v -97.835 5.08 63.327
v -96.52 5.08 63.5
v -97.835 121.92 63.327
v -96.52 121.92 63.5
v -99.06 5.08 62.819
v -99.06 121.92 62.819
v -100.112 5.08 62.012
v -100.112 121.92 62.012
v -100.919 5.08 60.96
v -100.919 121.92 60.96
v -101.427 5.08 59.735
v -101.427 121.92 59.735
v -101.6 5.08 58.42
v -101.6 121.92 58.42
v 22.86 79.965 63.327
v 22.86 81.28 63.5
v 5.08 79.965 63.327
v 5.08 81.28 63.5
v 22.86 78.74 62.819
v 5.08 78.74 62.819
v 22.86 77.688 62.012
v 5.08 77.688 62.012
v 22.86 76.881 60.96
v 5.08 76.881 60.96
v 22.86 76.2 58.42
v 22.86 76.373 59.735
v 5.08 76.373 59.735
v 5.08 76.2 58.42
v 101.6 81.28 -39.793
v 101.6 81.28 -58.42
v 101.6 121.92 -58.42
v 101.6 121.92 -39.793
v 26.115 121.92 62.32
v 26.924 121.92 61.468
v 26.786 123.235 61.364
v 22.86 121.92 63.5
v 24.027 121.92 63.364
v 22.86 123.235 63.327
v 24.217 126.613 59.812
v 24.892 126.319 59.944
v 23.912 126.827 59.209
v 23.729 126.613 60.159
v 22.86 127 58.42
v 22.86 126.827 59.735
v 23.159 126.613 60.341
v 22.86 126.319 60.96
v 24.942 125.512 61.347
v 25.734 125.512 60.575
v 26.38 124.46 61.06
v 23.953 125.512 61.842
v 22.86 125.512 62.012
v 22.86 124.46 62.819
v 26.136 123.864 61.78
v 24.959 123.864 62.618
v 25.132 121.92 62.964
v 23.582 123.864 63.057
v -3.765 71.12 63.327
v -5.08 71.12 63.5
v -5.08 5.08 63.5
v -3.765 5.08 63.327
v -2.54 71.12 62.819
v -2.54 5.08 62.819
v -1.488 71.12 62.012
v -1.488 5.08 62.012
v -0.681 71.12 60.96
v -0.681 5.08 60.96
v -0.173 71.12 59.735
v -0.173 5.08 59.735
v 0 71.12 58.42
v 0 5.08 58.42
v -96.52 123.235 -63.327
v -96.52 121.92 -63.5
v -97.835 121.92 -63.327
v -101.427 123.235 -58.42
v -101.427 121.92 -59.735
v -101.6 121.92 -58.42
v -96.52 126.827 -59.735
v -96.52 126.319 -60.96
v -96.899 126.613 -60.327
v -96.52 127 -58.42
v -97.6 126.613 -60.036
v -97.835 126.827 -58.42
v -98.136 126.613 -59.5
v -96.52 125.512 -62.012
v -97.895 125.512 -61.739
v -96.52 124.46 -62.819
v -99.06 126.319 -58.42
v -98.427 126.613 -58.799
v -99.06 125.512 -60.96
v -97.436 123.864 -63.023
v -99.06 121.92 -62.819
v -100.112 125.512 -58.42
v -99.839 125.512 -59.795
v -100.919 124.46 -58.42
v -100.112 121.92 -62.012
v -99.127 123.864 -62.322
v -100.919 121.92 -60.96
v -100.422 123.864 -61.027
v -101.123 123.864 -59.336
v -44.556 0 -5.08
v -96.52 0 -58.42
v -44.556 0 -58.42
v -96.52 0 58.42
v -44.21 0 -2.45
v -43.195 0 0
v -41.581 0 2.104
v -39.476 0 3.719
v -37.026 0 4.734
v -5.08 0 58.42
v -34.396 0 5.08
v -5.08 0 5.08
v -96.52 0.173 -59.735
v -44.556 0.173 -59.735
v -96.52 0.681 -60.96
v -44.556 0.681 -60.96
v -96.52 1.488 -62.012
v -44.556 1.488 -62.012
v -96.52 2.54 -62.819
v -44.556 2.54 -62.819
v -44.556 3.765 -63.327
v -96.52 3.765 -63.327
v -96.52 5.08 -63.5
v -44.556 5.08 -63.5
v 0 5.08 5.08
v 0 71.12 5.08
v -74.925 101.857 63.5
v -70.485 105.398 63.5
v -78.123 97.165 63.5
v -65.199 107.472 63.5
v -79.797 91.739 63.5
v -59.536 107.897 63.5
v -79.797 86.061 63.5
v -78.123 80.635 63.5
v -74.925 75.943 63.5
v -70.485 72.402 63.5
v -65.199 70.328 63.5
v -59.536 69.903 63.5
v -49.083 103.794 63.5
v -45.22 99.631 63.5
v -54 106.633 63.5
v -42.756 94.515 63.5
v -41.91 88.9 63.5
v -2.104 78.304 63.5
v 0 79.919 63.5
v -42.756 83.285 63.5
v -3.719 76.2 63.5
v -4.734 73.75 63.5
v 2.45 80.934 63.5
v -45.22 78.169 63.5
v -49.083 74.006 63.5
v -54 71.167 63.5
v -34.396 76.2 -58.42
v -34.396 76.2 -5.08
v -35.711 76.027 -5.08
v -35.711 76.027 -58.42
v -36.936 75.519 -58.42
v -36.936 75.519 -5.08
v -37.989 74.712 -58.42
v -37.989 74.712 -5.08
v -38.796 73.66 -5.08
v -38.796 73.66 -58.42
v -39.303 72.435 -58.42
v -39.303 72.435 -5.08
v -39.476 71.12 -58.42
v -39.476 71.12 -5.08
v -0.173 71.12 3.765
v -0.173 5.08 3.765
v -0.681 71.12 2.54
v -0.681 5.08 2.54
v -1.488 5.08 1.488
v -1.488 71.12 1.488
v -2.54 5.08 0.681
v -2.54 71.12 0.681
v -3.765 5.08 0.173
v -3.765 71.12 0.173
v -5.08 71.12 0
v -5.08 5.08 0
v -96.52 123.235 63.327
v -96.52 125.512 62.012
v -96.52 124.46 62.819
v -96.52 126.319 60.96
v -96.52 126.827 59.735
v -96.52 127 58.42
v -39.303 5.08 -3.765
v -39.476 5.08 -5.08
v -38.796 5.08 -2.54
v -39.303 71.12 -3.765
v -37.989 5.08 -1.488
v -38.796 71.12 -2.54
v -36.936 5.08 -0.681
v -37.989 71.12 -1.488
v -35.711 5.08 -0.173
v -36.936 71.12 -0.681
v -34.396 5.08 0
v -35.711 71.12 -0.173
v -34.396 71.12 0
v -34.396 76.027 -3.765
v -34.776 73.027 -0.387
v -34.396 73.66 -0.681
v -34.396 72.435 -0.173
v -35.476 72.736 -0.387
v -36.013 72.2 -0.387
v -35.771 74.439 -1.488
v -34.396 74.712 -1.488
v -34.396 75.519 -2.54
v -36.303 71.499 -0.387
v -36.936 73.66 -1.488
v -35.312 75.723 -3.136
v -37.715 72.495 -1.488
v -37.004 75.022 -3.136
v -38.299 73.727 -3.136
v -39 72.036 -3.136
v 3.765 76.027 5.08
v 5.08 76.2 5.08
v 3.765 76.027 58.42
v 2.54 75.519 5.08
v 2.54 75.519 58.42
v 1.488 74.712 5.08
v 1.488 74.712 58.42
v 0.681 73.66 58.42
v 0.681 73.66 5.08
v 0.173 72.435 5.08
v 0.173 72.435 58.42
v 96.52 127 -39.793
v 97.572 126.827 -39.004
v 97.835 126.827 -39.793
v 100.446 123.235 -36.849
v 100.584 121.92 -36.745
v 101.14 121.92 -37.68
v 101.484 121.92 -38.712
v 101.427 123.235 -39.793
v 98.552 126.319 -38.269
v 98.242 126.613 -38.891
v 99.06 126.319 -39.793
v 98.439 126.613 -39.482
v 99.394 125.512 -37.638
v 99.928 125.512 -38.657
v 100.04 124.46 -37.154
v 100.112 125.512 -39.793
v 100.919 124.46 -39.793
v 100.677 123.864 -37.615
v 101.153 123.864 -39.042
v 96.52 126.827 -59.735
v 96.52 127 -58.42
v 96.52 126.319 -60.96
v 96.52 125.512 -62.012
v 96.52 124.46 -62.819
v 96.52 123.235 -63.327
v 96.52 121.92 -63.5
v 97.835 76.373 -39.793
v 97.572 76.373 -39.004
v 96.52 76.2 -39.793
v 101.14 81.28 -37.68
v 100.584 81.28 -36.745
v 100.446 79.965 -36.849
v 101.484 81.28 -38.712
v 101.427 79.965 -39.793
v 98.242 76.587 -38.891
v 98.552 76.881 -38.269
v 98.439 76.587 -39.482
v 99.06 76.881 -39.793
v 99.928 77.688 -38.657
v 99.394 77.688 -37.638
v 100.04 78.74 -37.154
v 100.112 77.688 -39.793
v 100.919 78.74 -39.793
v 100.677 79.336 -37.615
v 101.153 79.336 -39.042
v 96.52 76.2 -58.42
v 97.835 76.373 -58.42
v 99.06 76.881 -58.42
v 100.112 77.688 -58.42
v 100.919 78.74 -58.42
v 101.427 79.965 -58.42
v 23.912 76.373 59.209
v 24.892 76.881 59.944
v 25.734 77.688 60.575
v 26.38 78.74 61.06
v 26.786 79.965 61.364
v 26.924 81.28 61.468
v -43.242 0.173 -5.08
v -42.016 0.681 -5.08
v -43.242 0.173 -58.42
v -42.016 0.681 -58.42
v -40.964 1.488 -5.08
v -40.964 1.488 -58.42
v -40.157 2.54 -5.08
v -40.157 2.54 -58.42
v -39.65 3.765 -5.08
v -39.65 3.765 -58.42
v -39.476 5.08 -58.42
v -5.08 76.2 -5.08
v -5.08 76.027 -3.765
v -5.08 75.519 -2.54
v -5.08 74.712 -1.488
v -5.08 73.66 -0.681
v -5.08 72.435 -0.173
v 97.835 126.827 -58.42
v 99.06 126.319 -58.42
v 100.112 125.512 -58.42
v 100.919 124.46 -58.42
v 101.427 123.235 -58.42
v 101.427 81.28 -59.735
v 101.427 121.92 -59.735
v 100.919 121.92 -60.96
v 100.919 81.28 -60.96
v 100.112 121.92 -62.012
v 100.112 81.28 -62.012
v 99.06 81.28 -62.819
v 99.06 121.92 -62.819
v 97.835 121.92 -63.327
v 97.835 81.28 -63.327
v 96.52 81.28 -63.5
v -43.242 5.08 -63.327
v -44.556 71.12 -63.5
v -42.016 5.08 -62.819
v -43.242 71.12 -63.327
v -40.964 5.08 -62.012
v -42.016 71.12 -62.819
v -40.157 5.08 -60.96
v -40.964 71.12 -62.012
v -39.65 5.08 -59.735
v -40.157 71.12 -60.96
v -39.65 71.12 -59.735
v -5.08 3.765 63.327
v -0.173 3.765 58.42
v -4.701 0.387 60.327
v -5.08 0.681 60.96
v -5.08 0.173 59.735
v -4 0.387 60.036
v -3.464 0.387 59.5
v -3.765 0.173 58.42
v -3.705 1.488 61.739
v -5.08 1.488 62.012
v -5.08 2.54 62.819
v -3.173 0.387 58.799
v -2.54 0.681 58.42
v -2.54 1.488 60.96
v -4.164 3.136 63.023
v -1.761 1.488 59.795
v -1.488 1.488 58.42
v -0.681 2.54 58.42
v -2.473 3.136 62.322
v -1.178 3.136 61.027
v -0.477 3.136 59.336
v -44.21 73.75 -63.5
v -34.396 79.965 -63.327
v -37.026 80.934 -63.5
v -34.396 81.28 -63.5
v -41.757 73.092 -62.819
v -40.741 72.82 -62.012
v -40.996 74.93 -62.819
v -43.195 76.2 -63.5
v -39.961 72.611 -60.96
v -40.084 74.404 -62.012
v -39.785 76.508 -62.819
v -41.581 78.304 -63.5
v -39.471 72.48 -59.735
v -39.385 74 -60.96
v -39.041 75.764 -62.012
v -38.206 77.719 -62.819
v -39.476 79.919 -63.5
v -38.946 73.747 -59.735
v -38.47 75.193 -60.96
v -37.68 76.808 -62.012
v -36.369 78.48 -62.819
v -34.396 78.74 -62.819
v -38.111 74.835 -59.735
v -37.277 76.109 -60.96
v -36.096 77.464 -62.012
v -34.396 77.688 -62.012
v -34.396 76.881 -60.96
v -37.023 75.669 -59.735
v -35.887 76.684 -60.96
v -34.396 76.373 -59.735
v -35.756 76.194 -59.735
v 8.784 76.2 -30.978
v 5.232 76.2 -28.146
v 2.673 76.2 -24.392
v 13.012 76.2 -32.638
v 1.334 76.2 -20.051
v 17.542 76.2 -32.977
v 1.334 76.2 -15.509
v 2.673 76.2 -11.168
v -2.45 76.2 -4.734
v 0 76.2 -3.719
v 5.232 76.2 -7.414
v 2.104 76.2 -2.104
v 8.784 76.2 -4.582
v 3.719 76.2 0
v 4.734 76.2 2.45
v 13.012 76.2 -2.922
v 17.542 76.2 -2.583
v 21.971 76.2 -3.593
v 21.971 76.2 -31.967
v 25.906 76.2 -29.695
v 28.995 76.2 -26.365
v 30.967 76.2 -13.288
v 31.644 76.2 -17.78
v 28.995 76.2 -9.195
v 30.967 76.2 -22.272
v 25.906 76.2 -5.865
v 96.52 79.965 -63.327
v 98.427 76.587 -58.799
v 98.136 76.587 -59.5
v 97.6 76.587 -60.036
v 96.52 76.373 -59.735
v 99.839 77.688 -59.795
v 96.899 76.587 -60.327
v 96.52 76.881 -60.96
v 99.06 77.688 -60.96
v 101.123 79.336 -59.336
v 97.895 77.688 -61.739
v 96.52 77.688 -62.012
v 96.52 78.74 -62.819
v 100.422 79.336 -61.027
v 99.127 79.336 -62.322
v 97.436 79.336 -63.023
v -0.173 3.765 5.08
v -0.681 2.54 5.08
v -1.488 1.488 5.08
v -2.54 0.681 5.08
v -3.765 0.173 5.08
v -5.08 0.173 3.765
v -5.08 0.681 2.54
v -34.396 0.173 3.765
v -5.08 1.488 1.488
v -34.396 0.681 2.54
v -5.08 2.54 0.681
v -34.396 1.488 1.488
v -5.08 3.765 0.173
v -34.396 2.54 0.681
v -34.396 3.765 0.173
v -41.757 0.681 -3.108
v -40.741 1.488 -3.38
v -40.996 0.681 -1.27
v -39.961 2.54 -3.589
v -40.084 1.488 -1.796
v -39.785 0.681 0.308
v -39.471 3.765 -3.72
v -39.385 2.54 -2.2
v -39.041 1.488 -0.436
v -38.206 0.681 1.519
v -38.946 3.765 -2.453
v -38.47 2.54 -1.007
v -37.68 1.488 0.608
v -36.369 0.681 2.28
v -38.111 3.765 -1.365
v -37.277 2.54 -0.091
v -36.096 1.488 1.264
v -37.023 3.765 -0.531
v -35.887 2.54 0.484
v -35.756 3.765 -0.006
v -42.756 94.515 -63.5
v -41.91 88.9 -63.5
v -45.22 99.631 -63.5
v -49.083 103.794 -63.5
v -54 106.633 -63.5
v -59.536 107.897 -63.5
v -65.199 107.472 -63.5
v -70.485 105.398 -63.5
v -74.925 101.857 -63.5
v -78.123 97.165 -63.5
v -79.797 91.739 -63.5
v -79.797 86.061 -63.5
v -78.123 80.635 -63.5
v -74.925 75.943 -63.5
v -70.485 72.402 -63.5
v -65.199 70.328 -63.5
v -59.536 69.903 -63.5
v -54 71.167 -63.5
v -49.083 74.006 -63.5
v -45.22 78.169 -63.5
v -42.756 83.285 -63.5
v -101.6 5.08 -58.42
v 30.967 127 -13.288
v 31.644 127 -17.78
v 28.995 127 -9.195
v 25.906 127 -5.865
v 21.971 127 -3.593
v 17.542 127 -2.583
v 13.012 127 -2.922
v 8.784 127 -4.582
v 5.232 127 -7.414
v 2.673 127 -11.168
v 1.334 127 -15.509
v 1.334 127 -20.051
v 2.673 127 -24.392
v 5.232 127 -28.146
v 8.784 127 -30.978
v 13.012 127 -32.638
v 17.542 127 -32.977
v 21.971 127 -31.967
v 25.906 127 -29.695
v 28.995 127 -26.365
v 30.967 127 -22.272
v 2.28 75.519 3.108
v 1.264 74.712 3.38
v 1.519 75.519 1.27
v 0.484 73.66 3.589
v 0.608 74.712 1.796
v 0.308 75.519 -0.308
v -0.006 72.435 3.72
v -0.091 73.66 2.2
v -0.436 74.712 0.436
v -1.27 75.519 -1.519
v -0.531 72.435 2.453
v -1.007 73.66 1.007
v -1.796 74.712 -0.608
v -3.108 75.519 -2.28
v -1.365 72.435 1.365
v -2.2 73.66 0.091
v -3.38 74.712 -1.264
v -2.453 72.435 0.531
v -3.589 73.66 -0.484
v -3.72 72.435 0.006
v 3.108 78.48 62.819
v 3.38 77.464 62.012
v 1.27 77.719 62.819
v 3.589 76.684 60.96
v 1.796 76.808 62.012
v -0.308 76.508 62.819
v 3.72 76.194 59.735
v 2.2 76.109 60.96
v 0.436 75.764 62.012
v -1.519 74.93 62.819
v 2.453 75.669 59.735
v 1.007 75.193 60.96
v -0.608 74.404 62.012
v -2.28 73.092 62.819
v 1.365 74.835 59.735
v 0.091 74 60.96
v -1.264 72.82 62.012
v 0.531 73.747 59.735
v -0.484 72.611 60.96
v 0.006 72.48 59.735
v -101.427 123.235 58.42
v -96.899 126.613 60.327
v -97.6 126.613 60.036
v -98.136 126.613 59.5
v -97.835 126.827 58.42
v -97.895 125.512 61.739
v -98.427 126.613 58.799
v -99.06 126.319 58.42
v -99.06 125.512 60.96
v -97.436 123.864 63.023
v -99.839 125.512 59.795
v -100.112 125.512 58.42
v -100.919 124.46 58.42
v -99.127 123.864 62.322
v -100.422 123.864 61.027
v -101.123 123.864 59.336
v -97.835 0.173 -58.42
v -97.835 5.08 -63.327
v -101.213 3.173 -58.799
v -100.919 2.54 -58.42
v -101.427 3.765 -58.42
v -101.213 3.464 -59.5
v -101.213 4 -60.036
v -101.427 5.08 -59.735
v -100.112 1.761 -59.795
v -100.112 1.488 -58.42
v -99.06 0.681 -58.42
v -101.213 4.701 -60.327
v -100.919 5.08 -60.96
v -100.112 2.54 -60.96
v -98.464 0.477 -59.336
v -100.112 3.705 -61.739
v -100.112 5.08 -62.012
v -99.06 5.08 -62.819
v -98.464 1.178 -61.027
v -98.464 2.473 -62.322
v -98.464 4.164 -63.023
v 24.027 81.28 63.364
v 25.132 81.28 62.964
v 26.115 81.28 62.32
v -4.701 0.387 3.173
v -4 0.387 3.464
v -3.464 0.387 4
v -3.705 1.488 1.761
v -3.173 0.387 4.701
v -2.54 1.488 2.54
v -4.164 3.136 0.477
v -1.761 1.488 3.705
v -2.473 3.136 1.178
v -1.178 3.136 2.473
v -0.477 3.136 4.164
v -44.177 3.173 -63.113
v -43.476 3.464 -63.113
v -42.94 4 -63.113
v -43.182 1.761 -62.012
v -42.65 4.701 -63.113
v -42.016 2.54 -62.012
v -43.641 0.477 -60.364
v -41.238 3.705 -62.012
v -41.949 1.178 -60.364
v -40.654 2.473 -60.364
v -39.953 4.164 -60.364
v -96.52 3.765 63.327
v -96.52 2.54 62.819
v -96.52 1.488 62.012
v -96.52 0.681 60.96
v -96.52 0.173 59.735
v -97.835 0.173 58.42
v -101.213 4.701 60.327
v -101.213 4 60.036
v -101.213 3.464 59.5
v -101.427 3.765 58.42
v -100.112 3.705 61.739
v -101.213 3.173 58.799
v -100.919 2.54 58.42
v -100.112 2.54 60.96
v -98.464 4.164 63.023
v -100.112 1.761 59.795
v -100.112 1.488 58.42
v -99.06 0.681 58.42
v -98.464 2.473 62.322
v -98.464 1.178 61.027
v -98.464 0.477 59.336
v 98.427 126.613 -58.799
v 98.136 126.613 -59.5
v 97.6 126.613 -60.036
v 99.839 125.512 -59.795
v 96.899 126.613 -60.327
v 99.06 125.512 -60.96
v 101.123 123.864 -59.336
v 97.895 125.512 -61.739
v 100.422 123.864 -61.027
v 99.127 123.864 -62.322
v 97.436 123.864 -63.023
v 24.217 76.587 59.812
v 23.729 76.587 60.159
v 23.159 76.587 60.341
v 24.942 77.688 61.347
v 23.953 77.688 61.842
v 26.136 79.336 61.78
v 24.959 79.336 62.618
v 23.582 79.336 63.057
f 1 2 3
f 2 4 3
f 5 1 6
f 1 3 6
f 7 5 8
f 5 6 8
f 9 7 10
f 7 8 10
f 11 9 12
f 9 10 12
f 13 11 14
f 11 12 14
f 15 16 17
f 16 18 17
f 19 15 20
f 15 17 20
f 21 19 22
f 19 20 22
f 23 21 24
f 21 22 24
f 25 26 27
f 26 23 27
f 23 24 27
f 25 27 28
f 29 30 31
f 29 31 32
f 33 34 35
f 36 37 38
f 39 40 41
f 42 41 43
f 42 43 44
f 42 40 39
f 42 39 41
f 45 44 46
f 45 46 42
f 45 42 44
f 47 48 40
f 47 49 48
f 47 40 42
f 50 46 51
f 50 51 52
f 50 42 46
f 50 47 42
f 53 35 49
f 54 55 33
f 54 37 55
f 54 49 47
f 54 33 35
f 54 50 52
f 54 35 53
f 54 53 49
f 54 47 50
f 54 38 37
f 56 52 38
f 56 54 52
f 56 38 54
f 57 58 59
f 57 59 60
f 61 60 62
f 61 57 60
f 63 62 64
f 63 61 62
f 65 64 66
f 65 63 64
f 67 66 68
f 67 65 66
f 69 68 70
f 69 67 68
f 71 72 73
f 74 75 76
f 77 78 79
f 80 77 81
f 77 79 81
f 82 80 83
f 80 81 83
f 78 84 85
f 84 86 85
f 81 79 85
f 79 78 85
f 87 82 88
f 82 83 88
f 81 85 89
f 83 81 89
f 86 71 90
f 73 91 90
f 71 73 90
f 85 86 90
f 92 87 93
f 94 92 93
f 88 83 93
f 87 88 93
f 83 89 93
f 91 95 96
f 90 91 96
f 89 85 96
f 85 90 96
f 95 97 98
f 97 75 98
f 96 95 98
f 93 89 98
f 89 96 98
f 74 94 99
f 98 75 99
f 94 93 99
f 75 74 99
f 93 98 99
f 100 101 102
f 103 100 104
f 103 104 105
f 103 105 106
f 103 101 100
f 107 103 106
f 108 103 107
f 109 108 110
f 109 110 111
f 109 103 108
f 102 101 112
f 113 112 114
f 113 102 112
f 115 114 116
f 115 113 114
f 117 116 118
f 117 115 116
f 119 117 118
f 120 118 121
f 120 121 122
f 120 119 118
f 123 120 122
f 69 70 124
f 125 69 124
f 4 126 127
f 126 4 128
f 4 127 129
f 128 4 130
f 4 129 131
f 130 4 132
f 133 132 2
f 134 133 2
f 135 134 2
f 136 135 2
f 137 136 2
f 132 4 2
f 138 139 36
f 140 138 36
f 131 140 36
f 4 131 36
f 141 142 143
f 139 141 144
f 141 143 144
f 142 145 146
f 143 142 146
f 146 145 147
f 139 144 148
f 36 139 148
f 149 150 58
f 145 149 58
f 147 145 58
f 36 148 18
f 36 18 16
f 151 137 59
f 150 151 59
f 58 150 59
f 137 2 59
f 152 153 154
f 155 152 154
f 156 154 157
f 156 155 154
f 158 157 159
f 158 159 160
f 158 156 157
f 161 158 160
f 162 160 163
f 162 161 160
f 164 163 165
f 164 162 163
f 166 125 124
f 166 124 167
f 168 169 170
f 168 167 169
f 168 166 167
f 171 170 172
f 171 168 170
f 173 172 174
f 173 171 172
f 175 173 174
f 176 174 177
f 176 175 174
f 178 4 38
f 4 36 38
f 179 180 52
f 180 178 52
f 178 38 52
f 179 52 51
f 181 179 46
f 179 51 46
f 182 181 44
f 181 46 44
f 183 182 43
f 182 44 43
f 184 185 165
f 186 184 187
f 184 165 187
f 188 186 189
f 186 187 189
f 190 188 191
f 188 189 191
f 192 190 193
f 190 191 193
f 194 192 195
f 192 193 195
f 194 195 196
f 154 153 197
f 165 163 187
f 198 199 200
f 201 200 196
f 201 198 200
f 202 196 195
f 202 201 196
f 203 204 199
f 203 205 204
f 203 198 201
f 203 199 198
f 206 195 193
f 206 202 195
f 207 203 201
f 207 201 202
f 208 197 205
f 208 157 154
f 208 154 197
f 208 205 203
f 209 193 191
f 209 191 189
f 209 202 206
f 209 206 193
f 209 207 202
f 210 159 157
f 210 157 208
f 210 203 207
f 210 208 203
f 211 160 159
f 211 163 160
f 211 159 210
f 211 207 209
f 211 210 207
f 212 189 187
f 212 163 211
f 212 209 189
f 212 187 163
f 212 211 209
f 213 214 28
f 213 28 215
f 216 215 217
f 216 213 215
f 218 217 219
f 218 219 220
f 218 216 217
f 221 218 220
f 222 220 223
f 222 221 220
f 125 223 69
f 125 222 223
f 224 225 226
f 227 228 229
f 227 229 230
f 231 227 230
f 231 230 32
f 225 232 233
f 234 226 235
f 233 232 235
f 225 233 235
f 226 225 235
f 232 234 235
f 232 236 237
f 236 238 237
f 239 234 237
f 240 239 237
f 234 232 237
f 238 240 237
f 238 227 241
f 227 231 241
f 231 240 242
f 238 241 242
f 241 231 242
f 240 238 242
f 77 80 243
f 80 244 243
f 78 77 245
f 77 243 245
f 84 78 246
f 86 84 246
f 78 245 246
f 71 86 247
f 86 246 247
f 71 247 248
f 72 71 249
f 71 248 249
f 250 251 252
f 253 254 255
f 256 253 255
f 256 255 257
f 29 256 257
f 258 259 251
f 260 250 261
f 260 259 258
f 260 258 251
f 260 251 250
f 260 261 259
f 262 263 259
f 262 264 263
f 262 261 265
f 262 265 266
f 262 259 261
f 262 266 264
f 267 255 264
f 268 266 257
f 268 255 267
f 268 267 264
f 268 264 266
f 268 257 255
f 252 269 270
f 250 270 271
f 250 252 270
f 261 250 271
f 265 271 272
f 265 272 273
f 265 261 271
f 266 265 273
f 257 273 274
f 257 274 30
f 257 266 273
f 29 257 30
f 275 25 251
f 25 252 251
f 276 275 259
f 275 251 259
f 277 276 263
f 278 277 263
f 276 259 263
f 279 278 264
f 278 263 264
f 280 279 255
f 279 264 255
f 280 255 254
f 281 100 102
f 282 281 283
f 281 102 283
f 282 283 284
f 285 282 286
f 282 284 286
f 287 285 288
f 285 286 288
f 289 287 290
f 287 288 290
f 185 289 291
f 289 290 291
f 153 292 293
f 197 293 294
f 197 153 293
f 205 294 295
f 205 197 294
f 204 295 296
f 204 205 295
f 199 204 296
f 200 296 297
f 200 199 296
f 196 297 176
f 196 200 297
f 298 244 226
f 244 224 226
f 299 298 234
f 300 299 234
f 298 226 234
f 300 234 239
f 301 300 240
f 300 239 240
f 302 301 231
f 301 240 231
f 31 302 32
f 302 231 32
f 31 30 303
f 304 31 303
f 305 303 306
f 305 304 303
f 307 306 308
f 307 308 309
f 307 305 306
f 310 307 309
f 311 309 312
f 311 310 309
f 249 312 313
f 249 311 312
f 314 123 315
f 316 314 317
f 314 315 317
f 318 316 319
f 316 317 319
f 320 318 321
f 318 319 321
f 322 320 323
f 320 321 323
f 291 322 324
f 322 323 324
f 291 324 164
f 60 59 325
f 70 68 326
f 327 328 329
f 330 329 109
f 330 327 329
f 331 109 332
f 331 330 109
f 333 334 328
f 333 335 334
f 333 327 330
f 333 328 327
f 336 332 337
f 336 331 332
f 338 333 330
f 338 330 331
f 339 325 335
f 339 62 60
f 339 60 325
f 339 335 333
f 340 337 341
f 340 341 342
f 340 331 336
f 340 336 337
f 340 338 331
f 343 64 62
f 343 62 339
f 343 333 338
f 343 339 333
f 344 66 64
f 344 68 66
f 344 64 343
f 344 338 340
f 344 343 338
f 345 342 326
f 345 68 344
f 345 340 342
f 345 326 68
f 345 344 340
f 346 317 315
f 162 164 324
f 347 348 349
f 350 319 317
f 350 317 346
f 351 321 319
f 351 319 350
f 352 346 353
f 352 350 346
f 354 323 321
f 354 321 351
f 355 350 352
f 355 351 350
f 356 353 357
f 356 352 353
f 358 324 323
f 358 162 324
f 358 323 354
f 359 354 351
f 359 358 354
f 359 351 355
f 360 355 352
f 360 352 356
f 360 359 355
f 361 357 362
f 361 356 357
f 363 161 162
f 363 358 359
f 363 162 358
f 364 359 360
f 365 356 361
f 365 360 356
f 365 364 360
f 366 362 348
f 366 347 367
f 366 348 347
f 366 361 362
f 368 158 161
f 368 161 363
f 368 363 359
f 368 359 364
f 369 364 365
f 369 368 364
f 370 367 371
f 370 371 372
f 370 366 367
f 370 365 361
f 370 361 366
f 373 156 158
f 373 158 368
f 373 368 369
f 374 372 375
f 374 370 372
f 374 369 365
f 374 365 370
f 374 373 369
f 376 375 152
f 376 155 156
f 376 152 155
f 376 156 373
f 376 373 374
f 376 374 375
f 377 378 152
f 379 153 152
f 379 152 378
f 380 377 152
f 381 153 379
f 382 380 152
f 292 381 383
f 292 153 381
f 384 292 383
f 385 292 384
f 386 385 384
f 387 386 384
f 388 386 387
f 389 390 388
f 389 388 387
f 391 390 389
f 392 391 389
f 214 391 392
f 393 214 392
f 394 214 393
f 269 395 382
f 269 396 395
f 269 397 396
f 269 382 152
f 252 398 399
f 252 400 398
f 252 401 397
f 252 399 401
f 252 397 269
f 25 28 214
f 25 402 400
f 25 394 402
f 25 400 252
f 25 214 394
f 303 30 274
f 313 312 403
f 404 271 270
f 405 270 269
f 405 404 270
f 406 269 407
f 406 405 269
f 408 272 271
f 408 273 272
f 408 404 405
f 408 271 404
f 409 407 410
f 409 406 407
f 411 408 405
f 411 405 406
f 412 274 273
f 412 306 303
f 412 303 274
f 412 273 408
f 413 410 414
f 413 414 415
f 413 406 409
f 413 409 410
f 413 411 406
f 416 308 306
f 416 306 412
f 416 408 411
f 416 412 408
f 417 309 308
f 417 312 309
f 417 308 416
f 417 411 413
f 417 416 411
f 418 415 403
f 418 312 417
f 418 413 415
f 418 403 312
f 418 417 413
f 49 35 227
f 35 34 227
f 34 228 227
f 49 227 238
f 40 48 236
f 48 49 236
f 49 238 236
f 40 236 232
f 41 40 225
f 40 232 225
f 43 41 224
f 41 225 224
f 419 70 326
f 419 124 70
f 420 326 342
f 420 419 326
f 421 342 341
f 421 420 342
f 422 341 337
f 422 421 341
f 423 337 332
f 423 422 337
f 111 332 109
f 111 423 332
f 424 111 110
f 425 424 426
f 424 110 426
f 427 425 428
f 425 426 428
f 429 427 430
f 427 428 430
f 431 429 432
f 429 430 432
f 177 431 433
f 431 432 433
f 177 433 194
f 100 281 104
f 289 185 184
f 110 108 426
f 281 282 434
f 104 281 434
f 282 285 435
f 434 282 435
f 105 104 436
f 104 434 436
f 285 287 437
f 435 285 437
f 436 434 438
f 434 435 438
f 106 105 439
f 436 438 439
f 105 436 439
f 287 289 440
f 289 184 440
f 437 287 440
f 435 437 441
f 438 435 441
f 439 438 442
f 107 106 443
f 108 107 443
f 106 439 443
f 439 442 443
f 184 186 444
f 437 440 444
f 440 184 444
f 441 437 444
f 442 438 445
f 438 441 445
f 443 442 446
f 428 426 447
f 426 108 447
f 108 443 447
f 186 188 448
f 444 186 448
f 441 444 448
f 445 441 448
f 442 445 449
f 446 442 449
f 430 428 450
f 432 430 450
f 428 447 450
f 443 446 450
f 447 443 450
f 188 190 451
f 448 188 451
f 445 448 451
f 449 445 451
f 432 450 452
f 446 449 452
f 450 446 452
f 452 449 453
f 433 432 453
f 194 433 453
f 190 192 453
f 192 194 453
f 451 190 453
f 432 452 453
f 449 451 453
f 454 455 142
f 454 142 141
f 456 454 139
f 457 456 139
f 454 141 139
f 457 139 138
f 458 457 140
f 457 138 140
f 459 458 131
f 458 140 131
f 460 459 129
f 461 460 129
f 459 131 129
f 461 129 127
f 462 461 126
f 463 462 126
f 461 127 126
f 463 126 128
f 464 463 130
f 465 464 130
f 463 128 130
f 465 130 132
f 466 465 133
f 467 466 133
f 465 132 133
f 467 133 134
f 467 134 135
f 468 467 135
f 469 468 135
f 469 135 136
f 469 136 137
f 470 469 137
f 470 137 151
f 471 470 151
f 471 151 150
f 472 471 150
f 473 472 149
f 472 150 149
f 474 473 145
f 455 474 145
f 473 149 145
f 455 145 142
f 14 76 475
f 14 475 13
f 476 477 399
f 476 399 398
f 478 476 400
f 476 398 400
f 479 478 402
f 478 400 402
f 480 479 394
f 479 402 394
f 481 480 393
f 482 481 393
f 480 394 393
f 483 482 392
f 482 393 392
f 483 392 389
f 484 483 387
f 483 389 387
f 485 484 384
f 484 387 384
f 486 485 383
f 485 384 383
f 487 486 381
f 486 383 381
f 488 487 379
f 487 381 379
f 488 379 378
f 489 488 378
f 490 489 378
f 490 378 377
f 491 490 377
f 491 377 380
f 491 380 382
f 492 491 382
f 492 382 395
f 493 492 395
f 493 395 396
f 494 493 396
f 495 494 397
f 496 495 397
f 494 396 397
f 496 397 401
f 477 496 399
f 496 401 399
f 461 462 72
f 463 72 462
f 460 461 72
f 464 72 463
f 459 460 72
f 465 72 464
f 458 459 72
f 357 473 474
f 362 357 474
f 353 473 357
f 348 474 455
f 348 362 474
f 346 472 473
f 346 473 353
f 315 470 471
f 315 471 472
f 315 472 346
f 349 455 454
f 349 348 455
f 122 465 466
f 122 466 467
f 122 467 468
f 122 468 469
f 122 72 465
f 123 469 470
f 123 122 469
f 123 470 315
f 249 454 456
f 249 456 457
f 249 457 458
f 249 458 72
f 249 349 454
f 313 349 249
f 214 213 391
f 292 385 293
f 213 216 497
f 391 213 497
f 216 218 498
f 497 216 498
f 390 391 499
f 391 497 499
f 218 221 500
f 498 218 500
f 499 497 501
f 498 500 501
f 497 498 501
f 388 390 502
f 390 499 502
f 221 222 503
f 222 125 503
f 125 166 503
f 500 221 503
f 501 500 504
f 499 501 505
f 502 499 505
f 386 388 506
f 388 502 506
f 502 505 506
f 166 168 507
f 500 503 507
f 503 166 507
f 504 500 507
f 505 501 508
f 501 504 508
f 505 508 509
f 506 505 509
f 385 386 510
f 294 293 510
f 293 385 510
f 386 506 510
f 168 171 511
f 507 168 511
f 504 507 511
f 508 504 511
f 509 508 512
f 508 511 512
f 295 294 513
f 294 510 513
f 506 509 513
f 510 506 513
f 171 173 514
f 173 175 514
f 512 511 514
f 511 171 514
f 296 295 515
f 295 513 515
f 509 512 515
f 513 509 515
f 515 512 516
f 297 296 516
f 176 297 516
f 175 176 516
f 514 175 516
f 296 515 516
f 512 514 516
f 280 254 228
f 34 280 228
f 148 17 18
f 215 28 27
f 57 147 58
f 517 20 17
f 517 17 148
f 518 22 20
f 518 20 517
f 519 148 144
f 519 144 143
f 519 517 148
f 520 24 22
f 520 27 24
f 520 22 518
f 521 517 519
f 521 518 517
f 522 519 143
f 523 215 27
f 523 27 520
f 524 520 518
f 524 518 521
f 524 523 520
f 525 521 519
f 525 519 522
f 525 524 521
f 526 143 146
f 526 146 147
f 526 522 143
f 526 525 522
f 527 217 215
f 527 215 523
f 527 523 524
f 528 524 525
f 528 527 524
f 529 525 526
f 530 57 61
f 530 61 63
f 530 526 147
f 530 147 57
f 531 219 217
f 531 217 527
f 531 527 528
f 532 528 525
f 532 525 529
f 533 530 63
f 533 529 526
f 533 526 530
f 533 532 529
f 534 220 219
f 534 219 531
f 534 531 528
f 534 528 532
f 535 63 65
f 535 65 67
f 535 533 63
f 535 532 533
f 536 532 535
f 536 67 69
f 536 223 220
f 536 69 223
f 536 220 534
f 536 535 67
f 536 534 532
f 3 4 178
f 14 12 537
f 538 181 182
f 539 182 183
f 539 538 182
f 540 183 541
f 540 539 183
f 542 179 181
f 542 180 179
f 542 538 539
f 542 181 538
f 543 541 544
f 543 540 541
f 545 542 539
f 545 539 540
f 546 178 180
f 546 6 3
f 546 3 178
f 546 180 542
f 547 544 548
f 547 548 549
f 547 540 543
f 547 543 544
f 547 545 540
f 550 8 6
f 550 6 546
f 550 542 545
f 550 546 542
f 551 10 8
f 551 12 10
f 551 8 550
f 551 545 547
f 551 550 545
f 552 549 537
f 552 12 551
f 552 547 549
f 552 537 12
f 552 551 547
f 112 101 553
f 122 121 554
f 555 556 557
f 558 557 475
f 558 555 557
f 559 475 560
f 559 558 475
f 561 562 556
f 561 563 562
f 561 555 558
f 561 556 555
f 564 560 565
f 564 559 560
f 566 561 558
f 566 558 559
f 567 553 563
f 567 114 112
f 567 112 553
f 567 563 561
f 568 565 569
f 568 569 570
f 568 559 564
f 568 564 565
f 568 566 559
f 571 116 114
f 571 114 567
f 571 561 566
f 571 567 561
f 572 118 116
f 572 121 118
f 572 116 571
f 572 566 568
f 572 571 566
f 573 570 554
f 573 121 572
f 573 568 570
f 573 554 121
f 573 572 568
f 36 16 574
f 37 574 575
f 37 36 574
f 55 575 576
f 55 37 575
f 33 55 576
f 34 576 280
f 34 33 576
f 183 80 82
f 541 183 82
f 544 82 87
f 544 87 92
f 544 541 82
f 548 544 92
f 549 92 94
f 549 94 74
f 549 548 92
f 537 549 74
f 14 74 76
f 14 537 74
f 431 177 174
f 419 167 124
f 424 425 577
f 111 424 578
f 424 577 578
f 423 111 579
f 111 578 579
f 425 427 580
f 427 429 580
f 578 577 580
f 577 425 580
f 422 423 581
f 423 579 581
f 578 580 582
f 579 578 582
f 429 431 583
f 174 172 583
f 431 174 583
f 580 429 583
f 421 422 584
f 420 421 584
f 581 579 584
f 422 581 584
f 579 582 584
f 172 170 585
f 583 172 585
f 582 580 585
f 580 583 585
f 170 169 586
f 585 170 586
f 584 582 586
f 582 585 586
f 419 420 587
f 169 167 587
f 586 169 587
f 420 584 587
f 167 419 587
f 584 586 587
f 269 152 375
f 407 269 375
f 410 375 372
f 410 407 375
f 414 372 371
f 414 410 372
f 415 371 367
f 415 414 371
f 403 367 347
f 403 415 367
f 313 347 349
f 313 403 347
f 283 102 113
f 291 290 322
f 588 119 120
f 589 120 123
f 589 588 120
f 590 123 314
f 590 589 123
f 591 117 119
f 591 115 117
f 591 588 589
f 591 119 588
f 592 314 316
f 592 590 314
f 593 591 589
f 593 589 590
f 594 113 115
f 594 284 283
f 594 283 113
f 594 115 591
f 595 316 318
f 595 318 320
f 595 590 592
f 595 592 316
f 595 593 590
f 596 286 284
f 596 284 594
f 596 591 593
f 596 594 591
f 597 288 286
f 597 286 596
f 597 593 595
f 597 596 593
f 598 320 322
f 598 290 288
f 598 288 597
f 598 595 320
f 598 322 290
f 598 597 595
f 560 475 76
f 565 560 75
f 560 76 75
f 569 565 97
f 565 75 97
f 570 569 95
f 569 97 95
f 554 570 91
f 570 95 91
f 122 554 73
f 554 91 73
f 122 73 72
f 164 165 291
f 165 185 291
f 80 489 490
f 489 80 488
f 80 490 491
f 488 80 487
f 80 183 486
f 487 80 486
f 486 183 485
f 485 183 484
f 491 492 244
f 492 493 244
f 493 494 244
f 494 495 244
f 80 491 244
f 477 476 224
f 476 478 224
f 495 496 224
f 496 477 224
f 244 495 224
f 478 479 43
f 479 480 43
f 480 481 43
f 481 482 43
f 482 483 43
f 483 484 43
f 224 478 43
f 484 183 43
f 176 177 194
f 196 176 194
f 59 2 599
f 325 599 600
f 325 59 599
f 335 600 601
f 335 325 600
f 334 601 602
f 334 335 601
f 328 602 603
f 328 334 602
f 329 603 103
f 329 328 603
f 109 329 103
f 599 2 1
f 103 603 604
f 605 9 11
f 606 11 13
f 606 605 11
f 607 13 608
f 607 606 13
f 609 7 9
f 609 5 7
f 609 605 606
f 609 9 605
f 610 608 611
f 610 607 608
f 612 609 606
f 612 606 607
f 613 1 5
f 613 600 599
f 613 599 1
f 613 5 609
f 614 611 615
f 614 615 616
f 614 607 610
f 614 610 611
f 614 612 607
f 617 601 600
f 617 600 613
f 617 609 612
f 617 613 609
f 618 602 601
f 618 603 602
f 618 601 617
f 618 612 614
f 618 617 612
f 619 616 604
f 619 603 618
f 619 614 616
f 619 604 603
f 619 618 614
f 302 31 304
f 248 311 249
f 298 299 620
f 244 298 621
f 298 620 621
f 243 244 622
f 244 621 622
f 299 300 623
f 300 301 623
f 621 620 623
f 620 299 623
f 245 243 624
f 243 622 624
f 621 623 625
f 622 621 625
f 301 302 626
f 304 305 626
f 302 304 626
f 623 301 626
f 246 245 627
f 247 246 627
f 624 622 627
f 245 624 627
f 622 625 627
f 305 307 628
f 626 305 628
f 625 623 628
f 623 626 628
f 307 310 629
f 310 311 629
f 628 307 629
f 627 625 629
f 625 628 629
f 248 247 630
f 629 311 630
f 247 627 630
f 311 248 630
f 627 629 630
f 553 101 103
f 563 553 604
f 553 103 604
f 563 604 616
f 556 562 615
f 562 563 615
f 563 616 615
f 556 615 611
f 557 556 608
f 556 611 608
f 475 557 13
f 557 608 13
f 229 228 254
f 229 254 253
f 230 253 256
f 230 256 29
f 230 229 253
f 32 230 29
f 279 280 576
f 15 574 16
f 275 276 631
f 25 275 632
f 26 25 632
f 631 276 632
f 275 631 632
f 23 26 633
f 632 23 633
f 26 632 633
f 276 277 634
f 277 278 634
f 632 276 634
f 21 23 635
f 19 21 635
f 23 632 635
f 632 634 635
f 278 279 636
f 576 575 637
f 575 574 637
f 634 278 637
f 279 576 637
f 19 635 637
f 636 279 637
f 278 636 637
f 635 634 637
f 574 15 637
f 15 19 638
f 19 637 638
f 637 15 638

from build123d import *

# Parameters (mm, degrees)
F0_W     = 203.2
F0_H     = 127
F1_DEPTH = 127
F3_DEPTH = 76.2
F4_SIZE2 = 101.6
F4_SIZE  = 76.2
F5_R     = 5.08
F6_R     = 15.24
F7_DEPTH = 50.8
F8_R     = 19.05
F9_DEPTH = 127


with BuildPart() as f1:
    # F0 (on Front) → F1 (new body)
    with BuildSketch(Plane.XZ):
        Rectangle(F0_W, F0_H)
    extrude(amount=-F1_DEPTH)

    # F2 (on face) → F3 (cut)
    with BuildSketch(Plane.XZ):
        Polygon((-39.4764244556, 0), (-39.4764244556, -63.5), (101.6, -63.5), (101.6, 63.5), (0, 63.5), (0, 0), align=None)
    extrude(amount=-F3_DEPTH, mode=Mode.SUBTRACT)

    # F4
    f4_edges = [f1.edges().sort_by_distance(p)[0] for p in [
        (101.6, 101.6, 63.5),
    ]]
    f4_side = f1.faces().sort_by_distance((-21.771429, 74.385714, 63.5))[0]
    chamfer(f4_edges, length=F4_SIZE, length2=F4_SIZE2, reference=f4_side)

    # F5
    f5_edges = [f1.edges().sort_by_distance(p)[0] for p in [
        (101.6, 101.6, -63.5),
        (101.6, 101.6, -38.1),
        (25.4, 101.6, 63.5),
        (63.5, 76.2, 12.7),
        (63.5, 127, 12.7),
        (12.7, 76.2, 63.5),
        (0, 38.1, 63.5),
        (0, 38.1, 0),
        (101.6, 76.2, -50.8),
        (31.061788, 76.2, -63.5),
        (-39.476424, 76.2, -31.75),
        (0, 76.2, 31.75),
        (-19.738212, 76.2, 0),
        (-39.476424, 0, -31.75),
        (-19.738212, 0, 0),
        (-50.8, 0, 63.5),
        (0, 0, 31.75),
        (-101.6, 63.5, 63.5),
        (-38.1, 127, 63.5),
        (-70.538212, 0, -63.5),
        (-101.6, 0, 0),
        (-101.6, 63.5, -63.5),
        (-39.476424, 38.1, 0),
        (101.6, 127, -50.8),
        (0, 127, -63.5),
        (-39.476424, 38.1, -63.5),
        (-101.6, 127, 0),
    ]]
    fillet(f5_edges, radius=F5_R)

    # F6 (on face) → F7 (cut, through all)
    with BuildSketch(Plane.XZ.offset(-76.2)):
        with Locations((16.4035755444, -17.78)):
            Circle(F6_R)
    extrude(amount=-F7_DEPTH, mode=Mode.SUBTRACT)

    # F8 (on face) → F9 (cut, through all)
    with BuildSketch(Plane.XY.offset(63.5)):
        with Locations((-60.96, 88.9)):
            Circle(F8_R)
    extrude(amount=-F9_DEPTH, mode=Mode.SUBTRACT)


solid = f1.part
